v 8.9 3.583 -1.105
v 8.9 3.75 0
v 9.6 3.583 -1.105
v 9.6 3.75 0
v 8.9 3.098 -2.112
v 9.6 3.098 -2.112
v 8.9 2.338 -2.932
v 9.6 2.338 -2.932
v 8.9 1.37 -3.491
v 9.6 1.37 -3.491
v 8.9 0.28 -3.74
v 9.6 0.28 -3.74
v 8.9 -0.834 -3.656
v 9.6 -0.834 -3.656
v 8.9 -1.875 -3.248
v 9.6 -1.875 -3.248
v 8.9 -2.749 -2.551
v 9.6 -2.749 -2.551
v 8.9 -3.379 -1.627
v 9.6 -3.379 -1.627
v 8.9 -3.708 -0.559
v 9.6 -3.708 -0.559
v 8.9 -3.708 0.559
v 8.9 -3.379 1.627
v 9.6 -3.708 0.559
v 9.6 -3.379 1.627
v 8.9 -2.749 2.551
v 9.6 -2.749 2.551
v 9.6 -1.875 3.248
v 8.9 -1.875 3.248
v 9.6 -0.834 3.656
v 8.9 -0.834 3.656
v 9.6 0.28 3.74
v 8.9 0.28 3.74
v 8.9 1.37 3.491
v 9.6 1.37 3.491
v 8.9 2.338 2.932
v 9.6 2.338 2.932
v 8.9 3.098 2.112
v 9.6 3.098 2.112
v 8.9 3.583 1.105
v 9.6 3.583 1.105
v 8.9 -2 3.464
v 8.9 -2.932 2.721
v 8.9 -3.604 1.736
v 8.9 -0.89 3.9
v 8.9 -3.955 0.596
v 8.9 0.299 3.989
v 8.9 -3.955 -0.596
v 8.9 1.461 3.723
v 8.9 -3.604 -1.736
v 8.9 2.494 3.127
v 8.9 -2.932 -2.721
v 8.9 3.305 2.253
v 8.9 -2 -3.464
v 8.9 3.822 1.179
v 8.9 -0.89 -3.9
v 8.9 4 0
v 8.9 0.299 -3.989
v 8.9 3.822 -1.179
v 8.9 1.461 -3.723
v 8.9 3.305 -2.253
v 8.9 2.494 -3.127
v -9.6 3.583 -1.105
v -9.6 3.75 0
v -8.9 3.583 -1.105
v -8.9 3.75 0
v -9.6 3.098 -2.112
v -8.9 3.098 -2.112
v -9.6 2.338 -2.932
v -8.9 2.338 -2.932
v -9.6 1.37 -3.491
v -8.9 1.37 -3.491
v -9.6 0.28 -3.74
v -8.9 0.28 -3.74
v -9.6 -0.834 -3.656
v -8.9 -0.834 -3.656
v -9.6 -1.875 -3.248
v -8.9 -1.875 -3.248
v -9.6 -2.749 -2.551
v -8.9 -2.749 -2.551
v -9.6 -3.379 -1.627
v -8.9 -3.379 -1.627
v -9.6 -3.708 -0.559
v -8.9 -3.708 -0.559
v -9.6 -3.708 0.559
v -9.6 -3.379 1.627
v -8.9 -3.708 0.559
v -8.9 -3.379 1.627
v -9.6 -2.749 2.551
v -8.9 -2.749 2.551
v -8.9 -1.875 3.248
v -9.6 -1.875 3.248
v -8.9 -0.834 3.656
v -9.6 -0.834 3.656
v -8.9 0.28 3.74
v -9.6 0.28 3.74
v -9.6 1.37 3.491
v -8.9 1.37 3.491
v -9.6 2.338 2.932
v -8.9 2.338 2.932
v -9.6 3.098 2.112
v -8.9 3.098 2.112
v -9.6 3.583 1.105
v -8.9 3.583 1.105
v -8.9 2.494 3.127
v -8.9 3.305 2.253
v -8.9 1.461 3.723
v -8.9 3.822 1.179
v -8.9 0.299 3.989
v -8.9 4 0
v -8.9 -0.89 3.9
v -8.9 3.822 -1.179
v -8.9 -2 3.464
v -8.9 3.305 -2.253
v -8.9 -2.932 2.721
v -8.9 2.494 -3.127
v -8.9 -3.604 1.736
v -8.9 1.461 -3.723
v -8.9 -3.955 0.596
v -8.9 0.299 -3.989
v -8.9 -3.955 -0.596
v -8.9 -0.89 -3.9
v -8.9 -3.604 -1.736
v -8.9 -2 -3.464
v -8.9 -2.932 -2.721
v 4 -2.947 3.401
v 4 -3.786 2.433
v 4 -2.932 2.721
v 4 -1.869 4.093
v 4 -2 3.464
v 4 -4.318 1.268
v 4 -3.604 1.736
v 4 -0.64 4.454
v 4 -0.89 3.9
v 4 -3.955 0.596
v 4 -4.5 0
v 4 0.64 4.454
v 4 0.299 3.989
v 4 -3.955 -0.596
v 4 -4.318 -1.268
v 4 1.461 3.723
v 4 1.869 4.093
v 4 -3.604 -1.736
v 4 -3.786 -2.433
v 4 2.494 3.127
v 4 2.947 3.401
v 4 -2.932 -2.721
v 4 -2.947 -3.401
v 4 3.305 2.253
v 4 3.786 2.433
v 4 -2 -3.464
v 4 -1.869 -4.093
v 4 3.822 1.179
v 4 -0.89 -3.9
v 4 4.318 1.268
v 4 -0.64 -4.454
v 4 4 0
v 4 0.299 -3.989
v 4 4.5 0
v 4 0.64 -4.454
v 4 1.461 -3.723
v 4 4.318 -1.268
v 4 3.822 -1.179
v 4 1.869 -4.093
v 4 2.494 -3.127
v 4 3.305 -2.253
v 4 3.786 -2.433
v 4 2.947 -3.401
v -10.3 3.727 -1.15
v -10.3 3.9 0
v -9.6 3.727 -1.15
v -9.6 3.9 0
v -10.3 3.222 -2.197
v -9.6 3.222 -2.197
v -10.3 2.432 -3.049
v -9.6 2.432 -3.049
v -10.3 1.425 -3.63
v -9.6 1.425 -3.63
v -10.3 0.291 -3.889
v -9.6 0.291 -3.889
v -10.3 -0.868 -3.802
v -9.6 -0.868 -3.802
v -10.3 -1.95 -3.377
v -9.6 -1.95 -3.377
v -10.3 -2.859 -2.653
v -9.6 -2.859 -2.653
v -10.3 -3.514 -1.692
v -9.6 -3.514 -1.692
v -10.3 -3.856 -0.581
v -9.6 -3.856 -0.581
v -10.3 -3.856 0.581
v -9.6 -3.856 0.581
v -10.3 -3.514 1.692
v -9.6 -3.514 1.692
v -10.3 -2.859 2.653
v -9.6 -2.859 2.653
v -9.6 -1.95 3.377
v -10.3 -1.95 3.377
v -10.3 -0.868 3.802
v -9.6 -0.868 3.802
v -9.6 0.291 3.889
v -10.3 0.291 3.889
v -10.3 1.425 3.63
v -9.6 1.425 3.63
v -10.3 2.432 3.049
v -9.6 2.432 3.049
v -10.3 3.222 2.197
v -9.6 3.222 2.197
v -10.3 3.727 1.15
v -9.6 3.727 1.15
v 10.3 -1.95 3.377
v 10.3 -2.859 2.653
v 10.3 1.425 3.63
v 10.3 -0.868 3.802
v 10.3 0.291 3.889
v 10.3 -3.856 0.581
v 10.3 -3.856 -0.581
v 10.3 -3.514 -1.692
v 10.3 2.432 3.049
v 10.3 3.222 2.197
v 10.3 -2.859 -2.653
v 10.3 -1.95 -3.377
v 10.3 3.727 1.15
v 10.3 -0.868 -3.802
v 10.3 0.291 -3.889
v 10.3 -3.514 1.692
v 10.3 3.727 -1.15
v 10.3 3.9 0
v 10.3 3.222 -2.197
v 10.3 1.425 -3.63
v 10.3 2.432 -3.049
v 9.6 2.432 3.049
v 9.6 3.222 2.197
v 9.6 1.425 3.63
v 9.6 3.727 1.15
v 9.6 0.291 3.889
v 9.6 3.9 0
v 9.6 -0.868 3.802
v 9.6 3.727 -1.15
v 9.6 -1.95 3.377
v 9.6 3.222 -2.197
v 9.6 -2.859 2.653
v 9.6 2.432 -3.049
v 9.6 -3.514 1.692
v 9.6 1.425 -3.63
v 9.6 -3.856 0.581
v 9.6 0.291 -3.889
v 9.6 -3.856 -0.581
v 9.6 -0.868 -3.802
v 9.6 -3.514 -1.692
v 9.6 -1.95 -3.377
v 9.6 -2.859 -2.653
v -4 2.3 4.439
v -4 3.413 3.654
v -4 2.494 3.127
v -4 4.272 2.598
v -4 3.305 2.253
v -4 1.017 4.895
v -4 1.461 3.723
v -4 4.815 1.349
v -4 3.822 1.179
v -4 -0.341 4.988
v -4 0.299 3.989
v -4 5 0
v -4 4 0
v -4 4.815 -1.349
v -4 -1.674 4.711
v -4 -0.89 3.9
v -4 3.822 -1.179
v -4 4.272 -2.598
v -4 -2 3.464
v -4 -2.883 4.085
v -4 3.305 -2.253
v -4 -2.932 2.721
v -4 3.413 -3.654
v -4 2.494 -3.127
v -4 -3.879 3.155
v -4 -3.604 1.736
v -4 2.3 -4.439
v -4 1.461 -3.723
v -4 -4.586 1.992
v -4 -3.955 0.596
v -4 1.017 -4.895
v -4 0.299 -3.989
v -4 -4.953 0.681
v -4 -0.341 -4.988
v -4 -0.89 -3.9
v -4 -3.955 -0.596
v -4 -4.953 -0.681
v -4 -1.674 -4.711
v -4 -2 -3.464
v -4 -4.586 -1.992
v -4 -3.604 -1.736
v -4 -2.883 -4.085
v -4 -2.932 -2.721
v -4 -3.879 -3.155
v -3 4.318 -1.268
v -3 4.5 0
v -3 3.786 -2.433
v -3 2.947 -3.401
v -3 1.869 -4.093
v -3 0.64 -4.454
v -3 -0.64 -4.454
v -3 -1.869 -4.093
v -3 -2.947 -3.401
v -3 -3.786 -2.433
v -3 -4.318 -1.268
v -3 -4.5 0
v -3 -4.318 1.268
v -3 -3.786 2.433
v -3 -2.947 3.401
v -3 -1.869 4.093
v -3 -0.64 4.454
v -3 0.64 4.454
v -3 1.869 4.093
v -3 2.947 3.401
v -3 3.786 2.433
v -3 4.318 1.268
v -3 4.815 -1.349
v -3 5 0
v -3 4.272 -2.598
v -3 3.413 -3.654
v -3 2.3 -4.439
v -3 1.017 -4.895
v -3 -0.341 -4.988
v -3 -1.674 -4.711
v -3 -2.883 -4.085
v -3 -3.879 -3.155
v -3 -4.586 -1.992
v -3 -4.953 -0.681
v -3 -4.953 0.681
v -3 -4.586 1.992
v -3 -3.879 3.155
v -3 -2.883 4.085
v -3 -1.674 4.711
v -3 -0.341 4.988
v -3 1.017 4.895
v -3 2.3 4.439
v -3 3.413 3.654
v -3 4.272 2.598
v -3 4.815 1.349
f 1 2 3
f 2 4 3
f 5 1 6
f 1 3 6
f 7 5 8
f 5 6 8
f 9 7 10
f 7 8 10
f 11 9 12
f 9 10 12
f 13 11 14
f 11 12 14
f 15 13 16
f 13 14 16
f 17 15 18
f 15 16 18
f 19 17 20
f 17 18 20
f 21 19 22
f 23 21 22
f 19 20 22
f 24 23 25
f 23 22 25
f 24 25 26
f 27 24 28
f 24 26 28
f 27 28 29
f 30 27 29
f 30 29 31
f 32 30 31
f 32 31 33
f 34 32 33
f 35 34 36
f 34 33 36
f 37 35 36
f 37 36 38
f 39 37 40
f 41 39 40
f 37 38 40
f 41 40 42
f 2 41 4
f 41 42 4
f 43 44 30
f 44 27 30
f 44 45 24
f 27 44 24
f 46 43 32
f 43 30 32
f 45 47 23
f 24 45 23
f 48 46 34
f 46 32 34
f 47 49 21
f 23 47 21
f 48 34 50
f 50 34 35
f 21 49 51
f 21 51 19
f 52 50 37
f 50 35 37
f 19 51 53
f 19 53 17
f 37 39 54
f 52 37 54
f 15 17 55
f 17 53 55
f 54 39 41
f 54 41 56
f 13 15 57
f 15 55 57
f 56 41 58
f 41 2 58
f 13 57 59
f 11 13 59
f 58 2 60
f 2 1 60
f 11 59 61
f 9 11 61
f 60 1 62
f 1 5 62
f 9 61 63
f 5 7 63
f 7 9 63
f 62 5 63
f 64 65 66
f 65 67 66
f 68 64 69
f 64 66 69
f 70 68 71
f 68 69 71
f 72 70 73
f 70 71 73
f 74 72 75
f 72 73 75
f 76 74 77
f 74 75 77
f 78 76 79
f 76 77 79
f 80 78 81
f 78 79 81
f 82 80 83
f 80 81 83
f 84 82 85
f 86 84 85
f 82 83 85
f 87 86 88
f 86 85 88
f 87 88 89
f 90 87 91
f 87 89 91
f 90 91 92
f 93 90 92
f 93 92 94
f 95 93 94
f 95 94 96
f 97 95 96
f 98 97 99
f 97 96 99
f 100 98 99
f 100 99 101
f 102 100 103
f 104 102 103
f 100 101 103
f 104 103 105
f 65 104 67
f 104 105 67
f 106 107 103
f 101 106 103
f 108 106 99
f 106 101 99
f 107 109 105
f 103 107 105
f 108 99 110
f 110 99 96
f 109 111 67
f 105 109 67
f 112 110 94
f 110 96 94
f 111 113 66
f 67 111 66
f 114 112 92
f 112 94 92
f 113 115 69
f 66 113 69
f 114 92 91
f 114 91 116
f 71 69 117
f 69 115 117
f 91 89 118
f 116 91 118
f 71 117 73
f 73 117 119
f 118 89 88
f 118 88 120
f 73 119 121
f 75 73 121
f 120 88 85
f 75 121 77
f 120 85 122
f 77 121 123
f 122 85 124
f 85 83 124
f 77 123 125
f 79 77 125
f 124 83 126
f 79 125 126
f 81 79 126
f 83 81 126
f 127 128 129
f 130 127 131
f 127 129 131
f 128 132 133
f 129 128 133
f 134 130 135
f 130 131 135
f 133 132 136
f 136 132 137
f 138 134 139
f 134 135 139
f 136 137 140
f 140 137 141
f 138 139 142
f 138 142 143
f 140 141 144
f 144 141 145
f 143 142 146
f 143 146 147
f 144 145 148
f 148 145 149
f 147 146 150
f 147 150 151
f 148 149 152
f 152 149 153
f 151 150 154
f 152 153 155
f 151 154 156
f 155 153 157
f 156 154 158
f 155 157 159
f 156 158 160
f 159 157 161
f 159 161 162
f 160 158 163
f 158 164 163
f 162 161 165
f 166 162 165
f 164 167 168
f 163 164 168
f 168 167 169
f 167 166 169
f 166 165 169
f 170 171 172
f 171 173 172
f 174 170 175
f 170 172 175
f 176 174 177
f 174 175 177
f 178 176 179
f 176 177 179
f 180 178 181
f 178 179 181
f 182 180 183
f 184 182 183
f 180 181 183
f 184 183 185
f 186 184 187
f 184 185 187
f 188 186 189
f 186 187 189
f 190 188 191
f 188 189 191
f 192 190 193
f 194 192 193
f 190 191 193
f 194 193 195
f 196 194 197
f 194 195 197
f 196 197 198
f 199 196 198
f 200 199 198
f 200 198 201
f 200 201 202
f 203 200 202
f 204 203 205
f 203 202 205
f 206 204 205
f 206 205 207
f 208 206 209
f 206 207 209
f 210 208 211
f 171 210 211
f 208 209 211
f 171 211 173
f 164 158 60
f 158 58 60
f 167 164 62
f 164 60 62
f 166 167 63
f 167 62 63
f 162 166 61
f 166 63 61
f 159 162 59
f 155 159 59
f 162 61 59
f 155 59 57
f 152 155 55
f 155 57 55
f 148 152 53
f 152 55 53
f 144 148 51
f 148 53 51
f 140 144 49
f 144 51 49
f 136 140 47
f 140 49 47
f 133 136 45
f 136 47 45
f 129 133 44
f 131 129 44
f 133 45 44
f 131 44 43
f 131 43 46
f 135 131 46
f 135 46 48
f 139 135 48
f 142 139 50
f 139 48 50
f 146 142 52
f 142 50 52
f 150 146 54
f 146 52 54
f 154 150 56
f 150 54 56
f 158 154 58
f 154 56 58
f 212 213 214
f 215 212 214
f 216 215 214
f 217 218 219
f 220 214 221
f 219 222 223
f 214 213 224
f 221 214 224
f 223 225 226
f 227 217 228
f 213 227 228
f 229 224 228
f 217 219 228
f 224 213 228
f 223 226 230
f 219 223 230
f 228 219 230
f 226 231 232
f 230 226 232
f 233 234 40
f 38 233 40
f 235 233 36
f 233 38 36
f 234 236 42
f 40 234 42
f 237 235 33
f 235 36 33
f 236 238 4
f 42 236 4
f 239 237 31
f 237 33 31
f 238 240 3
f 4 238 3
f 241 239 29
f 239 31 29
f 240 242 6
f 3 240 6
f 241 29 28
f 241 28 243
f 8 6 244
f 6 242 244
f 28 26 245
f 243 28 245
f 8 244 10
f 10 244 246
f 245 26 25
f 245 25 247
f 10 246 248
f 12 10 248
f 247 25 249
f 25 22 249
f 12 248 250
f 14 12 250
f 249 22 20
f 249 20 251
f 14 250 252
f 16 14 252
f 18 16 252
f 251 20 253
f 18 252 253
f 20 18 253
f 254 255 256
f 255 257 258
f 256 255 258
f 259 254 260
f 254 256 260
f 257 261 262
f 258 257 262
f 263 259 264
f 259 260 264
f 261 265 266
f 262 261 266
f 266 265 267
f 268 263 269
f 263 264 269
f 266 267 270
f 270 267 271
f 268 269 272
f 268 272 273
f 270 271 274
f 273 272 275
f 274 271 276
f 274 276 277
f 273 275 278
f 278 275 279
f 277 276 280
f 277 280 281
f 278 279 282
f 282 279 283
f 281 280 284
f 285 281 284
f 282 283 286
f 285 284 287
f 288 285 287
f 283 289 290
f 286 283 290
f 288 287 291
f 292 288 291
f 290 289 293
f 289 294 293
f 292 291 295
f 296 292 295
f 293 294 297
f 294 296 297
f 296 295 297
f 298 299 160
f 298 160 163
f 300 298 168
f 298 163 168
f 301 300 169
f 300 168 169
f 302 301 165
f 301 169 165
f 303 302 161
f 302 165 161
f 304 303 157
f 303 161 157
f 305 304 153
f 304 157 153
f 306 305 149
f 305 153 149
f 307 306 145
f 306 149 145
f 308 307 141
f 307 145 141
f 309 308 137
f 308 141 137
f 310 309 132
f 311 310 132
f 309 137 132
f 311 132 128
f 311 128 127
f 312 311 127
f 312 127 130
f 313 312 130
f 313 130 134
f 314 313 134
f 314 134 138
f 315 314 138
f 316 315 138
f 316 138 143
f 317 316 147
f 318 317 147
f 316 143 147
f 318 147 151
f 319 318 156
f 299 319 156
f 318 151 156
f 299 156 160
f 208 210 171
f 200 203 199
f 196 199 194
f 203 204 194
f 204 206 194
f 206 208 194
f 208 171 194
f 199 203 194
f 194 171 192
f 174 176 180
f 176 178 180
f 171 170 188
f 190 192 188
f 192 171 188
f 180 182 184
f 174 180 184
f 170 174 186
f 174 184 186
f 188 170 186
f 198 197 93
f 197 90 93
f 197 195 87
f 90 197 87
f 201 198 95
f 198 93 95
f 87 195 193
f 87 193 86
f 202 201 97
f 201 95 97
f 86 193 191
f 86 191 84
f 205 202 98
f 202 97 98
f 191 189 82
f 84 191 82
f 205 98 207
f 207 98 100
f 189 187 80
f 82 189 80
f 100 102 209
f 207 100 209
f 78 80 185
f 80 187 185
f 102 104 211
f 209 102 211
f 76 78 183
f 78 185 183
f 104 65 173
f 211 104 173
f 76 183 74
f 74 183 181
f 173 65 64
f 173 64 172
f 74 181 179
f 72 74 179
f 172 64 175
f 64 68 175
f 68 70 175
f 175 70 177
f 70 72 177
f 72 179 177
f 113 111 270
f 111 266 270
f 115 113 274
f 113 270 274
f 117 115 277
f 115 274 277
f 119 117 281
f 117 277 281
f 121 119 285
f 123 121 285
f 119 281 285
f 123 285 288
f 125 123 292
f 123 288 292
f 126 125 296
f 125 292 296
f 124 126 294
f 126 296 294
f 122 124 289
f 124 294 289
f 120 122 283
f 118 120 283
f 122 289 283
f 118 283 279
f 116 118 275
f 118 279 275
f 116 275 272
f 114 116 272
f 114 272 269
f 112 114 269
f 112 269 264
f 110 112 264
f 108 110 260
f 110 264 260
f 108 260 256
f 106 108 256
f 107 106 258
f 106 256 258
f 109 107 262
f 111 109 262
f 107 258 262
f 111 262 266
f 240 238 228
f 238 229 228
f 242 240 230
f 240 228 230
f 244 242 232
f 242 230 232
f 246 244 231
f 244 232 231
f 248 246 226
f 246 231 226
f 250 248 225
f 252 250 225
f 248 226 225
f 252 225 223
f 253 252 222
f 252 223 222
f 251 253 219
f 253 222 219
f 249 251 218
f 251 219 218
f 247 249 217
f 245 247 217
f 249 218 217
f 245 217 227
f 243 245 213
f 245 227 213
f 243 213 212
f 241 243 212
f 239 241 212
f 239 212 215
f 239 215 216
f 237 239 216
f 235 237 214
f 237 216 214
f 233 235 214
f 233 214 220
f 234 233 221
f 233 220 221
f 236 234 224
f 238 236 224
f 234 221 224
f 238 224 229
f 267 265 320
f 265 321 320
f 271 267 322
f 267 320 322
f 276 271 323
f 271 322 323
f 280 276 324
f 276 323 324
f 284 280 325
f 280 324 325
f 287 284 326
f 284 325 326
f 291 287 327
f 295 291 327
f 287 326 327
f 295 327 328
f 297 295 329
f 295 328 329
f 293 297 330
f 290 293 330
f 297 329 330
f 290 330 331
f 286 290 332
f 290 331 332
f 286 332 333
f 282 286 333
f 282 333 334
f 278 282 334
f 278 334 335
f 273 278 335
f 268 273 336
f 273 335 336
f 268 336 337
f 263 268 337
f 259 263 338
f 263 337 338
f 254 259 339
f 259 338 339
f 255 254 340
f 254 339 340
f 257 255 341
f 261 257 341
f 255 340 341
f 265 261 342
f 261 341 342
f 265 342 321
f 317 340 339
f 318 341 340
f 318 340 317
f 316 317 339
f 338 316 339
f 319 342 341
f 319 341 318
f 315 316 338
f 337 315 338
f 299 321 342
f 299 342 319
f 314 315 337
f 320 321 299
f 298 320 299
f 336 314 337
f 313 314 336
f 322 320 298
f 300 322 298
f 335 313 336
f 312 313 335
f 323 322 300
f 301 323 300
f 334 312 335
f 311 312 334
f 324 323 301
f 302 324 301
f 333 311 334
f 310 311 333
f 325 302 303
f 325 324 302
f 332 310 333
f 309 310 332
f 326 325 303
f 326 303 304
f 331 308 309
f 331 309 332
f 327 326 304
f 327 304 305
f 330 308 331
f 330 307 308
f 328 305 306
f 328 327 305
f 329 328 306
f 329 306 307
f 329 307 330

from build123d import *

# Parameters (mm, degrees)
SKETCH3_W = 1
SKETCH3_H = 0.5


with BuildPart() as part:
    # Sketch1 → Revolve1 (revolve)
    with BuildSketch(Plane.XY):
        Polygon((10.3, 0), (-10.3, 0), (-10.3, 3.9), (-9.6, 3.9), (-9.6, 3.75), (-8.9, 3.75), (-8.9, 4), (-4, 4), (-4, 4.5), (4, 4.5), (4, 4), (8.9, 4), (8.9, 3.75), (9.6, 3.75), (9.6, 3.9), (10.3, 3.9), align=None)
    revolve(axis=Axis((15.691805076, 0, 0), (-1, 0, 0)))

    # Sketch3 → Revolve2 (revolve)
    with BuildSketch(Plane.XY):
        with Locations((-3.5, 4.75)):
            Rectangle(SKETCH3_W, SKETCH3_H)
    revolve(axis=Axis((0, 0, 0), (-1, 0, 0)))


solid = part.part
